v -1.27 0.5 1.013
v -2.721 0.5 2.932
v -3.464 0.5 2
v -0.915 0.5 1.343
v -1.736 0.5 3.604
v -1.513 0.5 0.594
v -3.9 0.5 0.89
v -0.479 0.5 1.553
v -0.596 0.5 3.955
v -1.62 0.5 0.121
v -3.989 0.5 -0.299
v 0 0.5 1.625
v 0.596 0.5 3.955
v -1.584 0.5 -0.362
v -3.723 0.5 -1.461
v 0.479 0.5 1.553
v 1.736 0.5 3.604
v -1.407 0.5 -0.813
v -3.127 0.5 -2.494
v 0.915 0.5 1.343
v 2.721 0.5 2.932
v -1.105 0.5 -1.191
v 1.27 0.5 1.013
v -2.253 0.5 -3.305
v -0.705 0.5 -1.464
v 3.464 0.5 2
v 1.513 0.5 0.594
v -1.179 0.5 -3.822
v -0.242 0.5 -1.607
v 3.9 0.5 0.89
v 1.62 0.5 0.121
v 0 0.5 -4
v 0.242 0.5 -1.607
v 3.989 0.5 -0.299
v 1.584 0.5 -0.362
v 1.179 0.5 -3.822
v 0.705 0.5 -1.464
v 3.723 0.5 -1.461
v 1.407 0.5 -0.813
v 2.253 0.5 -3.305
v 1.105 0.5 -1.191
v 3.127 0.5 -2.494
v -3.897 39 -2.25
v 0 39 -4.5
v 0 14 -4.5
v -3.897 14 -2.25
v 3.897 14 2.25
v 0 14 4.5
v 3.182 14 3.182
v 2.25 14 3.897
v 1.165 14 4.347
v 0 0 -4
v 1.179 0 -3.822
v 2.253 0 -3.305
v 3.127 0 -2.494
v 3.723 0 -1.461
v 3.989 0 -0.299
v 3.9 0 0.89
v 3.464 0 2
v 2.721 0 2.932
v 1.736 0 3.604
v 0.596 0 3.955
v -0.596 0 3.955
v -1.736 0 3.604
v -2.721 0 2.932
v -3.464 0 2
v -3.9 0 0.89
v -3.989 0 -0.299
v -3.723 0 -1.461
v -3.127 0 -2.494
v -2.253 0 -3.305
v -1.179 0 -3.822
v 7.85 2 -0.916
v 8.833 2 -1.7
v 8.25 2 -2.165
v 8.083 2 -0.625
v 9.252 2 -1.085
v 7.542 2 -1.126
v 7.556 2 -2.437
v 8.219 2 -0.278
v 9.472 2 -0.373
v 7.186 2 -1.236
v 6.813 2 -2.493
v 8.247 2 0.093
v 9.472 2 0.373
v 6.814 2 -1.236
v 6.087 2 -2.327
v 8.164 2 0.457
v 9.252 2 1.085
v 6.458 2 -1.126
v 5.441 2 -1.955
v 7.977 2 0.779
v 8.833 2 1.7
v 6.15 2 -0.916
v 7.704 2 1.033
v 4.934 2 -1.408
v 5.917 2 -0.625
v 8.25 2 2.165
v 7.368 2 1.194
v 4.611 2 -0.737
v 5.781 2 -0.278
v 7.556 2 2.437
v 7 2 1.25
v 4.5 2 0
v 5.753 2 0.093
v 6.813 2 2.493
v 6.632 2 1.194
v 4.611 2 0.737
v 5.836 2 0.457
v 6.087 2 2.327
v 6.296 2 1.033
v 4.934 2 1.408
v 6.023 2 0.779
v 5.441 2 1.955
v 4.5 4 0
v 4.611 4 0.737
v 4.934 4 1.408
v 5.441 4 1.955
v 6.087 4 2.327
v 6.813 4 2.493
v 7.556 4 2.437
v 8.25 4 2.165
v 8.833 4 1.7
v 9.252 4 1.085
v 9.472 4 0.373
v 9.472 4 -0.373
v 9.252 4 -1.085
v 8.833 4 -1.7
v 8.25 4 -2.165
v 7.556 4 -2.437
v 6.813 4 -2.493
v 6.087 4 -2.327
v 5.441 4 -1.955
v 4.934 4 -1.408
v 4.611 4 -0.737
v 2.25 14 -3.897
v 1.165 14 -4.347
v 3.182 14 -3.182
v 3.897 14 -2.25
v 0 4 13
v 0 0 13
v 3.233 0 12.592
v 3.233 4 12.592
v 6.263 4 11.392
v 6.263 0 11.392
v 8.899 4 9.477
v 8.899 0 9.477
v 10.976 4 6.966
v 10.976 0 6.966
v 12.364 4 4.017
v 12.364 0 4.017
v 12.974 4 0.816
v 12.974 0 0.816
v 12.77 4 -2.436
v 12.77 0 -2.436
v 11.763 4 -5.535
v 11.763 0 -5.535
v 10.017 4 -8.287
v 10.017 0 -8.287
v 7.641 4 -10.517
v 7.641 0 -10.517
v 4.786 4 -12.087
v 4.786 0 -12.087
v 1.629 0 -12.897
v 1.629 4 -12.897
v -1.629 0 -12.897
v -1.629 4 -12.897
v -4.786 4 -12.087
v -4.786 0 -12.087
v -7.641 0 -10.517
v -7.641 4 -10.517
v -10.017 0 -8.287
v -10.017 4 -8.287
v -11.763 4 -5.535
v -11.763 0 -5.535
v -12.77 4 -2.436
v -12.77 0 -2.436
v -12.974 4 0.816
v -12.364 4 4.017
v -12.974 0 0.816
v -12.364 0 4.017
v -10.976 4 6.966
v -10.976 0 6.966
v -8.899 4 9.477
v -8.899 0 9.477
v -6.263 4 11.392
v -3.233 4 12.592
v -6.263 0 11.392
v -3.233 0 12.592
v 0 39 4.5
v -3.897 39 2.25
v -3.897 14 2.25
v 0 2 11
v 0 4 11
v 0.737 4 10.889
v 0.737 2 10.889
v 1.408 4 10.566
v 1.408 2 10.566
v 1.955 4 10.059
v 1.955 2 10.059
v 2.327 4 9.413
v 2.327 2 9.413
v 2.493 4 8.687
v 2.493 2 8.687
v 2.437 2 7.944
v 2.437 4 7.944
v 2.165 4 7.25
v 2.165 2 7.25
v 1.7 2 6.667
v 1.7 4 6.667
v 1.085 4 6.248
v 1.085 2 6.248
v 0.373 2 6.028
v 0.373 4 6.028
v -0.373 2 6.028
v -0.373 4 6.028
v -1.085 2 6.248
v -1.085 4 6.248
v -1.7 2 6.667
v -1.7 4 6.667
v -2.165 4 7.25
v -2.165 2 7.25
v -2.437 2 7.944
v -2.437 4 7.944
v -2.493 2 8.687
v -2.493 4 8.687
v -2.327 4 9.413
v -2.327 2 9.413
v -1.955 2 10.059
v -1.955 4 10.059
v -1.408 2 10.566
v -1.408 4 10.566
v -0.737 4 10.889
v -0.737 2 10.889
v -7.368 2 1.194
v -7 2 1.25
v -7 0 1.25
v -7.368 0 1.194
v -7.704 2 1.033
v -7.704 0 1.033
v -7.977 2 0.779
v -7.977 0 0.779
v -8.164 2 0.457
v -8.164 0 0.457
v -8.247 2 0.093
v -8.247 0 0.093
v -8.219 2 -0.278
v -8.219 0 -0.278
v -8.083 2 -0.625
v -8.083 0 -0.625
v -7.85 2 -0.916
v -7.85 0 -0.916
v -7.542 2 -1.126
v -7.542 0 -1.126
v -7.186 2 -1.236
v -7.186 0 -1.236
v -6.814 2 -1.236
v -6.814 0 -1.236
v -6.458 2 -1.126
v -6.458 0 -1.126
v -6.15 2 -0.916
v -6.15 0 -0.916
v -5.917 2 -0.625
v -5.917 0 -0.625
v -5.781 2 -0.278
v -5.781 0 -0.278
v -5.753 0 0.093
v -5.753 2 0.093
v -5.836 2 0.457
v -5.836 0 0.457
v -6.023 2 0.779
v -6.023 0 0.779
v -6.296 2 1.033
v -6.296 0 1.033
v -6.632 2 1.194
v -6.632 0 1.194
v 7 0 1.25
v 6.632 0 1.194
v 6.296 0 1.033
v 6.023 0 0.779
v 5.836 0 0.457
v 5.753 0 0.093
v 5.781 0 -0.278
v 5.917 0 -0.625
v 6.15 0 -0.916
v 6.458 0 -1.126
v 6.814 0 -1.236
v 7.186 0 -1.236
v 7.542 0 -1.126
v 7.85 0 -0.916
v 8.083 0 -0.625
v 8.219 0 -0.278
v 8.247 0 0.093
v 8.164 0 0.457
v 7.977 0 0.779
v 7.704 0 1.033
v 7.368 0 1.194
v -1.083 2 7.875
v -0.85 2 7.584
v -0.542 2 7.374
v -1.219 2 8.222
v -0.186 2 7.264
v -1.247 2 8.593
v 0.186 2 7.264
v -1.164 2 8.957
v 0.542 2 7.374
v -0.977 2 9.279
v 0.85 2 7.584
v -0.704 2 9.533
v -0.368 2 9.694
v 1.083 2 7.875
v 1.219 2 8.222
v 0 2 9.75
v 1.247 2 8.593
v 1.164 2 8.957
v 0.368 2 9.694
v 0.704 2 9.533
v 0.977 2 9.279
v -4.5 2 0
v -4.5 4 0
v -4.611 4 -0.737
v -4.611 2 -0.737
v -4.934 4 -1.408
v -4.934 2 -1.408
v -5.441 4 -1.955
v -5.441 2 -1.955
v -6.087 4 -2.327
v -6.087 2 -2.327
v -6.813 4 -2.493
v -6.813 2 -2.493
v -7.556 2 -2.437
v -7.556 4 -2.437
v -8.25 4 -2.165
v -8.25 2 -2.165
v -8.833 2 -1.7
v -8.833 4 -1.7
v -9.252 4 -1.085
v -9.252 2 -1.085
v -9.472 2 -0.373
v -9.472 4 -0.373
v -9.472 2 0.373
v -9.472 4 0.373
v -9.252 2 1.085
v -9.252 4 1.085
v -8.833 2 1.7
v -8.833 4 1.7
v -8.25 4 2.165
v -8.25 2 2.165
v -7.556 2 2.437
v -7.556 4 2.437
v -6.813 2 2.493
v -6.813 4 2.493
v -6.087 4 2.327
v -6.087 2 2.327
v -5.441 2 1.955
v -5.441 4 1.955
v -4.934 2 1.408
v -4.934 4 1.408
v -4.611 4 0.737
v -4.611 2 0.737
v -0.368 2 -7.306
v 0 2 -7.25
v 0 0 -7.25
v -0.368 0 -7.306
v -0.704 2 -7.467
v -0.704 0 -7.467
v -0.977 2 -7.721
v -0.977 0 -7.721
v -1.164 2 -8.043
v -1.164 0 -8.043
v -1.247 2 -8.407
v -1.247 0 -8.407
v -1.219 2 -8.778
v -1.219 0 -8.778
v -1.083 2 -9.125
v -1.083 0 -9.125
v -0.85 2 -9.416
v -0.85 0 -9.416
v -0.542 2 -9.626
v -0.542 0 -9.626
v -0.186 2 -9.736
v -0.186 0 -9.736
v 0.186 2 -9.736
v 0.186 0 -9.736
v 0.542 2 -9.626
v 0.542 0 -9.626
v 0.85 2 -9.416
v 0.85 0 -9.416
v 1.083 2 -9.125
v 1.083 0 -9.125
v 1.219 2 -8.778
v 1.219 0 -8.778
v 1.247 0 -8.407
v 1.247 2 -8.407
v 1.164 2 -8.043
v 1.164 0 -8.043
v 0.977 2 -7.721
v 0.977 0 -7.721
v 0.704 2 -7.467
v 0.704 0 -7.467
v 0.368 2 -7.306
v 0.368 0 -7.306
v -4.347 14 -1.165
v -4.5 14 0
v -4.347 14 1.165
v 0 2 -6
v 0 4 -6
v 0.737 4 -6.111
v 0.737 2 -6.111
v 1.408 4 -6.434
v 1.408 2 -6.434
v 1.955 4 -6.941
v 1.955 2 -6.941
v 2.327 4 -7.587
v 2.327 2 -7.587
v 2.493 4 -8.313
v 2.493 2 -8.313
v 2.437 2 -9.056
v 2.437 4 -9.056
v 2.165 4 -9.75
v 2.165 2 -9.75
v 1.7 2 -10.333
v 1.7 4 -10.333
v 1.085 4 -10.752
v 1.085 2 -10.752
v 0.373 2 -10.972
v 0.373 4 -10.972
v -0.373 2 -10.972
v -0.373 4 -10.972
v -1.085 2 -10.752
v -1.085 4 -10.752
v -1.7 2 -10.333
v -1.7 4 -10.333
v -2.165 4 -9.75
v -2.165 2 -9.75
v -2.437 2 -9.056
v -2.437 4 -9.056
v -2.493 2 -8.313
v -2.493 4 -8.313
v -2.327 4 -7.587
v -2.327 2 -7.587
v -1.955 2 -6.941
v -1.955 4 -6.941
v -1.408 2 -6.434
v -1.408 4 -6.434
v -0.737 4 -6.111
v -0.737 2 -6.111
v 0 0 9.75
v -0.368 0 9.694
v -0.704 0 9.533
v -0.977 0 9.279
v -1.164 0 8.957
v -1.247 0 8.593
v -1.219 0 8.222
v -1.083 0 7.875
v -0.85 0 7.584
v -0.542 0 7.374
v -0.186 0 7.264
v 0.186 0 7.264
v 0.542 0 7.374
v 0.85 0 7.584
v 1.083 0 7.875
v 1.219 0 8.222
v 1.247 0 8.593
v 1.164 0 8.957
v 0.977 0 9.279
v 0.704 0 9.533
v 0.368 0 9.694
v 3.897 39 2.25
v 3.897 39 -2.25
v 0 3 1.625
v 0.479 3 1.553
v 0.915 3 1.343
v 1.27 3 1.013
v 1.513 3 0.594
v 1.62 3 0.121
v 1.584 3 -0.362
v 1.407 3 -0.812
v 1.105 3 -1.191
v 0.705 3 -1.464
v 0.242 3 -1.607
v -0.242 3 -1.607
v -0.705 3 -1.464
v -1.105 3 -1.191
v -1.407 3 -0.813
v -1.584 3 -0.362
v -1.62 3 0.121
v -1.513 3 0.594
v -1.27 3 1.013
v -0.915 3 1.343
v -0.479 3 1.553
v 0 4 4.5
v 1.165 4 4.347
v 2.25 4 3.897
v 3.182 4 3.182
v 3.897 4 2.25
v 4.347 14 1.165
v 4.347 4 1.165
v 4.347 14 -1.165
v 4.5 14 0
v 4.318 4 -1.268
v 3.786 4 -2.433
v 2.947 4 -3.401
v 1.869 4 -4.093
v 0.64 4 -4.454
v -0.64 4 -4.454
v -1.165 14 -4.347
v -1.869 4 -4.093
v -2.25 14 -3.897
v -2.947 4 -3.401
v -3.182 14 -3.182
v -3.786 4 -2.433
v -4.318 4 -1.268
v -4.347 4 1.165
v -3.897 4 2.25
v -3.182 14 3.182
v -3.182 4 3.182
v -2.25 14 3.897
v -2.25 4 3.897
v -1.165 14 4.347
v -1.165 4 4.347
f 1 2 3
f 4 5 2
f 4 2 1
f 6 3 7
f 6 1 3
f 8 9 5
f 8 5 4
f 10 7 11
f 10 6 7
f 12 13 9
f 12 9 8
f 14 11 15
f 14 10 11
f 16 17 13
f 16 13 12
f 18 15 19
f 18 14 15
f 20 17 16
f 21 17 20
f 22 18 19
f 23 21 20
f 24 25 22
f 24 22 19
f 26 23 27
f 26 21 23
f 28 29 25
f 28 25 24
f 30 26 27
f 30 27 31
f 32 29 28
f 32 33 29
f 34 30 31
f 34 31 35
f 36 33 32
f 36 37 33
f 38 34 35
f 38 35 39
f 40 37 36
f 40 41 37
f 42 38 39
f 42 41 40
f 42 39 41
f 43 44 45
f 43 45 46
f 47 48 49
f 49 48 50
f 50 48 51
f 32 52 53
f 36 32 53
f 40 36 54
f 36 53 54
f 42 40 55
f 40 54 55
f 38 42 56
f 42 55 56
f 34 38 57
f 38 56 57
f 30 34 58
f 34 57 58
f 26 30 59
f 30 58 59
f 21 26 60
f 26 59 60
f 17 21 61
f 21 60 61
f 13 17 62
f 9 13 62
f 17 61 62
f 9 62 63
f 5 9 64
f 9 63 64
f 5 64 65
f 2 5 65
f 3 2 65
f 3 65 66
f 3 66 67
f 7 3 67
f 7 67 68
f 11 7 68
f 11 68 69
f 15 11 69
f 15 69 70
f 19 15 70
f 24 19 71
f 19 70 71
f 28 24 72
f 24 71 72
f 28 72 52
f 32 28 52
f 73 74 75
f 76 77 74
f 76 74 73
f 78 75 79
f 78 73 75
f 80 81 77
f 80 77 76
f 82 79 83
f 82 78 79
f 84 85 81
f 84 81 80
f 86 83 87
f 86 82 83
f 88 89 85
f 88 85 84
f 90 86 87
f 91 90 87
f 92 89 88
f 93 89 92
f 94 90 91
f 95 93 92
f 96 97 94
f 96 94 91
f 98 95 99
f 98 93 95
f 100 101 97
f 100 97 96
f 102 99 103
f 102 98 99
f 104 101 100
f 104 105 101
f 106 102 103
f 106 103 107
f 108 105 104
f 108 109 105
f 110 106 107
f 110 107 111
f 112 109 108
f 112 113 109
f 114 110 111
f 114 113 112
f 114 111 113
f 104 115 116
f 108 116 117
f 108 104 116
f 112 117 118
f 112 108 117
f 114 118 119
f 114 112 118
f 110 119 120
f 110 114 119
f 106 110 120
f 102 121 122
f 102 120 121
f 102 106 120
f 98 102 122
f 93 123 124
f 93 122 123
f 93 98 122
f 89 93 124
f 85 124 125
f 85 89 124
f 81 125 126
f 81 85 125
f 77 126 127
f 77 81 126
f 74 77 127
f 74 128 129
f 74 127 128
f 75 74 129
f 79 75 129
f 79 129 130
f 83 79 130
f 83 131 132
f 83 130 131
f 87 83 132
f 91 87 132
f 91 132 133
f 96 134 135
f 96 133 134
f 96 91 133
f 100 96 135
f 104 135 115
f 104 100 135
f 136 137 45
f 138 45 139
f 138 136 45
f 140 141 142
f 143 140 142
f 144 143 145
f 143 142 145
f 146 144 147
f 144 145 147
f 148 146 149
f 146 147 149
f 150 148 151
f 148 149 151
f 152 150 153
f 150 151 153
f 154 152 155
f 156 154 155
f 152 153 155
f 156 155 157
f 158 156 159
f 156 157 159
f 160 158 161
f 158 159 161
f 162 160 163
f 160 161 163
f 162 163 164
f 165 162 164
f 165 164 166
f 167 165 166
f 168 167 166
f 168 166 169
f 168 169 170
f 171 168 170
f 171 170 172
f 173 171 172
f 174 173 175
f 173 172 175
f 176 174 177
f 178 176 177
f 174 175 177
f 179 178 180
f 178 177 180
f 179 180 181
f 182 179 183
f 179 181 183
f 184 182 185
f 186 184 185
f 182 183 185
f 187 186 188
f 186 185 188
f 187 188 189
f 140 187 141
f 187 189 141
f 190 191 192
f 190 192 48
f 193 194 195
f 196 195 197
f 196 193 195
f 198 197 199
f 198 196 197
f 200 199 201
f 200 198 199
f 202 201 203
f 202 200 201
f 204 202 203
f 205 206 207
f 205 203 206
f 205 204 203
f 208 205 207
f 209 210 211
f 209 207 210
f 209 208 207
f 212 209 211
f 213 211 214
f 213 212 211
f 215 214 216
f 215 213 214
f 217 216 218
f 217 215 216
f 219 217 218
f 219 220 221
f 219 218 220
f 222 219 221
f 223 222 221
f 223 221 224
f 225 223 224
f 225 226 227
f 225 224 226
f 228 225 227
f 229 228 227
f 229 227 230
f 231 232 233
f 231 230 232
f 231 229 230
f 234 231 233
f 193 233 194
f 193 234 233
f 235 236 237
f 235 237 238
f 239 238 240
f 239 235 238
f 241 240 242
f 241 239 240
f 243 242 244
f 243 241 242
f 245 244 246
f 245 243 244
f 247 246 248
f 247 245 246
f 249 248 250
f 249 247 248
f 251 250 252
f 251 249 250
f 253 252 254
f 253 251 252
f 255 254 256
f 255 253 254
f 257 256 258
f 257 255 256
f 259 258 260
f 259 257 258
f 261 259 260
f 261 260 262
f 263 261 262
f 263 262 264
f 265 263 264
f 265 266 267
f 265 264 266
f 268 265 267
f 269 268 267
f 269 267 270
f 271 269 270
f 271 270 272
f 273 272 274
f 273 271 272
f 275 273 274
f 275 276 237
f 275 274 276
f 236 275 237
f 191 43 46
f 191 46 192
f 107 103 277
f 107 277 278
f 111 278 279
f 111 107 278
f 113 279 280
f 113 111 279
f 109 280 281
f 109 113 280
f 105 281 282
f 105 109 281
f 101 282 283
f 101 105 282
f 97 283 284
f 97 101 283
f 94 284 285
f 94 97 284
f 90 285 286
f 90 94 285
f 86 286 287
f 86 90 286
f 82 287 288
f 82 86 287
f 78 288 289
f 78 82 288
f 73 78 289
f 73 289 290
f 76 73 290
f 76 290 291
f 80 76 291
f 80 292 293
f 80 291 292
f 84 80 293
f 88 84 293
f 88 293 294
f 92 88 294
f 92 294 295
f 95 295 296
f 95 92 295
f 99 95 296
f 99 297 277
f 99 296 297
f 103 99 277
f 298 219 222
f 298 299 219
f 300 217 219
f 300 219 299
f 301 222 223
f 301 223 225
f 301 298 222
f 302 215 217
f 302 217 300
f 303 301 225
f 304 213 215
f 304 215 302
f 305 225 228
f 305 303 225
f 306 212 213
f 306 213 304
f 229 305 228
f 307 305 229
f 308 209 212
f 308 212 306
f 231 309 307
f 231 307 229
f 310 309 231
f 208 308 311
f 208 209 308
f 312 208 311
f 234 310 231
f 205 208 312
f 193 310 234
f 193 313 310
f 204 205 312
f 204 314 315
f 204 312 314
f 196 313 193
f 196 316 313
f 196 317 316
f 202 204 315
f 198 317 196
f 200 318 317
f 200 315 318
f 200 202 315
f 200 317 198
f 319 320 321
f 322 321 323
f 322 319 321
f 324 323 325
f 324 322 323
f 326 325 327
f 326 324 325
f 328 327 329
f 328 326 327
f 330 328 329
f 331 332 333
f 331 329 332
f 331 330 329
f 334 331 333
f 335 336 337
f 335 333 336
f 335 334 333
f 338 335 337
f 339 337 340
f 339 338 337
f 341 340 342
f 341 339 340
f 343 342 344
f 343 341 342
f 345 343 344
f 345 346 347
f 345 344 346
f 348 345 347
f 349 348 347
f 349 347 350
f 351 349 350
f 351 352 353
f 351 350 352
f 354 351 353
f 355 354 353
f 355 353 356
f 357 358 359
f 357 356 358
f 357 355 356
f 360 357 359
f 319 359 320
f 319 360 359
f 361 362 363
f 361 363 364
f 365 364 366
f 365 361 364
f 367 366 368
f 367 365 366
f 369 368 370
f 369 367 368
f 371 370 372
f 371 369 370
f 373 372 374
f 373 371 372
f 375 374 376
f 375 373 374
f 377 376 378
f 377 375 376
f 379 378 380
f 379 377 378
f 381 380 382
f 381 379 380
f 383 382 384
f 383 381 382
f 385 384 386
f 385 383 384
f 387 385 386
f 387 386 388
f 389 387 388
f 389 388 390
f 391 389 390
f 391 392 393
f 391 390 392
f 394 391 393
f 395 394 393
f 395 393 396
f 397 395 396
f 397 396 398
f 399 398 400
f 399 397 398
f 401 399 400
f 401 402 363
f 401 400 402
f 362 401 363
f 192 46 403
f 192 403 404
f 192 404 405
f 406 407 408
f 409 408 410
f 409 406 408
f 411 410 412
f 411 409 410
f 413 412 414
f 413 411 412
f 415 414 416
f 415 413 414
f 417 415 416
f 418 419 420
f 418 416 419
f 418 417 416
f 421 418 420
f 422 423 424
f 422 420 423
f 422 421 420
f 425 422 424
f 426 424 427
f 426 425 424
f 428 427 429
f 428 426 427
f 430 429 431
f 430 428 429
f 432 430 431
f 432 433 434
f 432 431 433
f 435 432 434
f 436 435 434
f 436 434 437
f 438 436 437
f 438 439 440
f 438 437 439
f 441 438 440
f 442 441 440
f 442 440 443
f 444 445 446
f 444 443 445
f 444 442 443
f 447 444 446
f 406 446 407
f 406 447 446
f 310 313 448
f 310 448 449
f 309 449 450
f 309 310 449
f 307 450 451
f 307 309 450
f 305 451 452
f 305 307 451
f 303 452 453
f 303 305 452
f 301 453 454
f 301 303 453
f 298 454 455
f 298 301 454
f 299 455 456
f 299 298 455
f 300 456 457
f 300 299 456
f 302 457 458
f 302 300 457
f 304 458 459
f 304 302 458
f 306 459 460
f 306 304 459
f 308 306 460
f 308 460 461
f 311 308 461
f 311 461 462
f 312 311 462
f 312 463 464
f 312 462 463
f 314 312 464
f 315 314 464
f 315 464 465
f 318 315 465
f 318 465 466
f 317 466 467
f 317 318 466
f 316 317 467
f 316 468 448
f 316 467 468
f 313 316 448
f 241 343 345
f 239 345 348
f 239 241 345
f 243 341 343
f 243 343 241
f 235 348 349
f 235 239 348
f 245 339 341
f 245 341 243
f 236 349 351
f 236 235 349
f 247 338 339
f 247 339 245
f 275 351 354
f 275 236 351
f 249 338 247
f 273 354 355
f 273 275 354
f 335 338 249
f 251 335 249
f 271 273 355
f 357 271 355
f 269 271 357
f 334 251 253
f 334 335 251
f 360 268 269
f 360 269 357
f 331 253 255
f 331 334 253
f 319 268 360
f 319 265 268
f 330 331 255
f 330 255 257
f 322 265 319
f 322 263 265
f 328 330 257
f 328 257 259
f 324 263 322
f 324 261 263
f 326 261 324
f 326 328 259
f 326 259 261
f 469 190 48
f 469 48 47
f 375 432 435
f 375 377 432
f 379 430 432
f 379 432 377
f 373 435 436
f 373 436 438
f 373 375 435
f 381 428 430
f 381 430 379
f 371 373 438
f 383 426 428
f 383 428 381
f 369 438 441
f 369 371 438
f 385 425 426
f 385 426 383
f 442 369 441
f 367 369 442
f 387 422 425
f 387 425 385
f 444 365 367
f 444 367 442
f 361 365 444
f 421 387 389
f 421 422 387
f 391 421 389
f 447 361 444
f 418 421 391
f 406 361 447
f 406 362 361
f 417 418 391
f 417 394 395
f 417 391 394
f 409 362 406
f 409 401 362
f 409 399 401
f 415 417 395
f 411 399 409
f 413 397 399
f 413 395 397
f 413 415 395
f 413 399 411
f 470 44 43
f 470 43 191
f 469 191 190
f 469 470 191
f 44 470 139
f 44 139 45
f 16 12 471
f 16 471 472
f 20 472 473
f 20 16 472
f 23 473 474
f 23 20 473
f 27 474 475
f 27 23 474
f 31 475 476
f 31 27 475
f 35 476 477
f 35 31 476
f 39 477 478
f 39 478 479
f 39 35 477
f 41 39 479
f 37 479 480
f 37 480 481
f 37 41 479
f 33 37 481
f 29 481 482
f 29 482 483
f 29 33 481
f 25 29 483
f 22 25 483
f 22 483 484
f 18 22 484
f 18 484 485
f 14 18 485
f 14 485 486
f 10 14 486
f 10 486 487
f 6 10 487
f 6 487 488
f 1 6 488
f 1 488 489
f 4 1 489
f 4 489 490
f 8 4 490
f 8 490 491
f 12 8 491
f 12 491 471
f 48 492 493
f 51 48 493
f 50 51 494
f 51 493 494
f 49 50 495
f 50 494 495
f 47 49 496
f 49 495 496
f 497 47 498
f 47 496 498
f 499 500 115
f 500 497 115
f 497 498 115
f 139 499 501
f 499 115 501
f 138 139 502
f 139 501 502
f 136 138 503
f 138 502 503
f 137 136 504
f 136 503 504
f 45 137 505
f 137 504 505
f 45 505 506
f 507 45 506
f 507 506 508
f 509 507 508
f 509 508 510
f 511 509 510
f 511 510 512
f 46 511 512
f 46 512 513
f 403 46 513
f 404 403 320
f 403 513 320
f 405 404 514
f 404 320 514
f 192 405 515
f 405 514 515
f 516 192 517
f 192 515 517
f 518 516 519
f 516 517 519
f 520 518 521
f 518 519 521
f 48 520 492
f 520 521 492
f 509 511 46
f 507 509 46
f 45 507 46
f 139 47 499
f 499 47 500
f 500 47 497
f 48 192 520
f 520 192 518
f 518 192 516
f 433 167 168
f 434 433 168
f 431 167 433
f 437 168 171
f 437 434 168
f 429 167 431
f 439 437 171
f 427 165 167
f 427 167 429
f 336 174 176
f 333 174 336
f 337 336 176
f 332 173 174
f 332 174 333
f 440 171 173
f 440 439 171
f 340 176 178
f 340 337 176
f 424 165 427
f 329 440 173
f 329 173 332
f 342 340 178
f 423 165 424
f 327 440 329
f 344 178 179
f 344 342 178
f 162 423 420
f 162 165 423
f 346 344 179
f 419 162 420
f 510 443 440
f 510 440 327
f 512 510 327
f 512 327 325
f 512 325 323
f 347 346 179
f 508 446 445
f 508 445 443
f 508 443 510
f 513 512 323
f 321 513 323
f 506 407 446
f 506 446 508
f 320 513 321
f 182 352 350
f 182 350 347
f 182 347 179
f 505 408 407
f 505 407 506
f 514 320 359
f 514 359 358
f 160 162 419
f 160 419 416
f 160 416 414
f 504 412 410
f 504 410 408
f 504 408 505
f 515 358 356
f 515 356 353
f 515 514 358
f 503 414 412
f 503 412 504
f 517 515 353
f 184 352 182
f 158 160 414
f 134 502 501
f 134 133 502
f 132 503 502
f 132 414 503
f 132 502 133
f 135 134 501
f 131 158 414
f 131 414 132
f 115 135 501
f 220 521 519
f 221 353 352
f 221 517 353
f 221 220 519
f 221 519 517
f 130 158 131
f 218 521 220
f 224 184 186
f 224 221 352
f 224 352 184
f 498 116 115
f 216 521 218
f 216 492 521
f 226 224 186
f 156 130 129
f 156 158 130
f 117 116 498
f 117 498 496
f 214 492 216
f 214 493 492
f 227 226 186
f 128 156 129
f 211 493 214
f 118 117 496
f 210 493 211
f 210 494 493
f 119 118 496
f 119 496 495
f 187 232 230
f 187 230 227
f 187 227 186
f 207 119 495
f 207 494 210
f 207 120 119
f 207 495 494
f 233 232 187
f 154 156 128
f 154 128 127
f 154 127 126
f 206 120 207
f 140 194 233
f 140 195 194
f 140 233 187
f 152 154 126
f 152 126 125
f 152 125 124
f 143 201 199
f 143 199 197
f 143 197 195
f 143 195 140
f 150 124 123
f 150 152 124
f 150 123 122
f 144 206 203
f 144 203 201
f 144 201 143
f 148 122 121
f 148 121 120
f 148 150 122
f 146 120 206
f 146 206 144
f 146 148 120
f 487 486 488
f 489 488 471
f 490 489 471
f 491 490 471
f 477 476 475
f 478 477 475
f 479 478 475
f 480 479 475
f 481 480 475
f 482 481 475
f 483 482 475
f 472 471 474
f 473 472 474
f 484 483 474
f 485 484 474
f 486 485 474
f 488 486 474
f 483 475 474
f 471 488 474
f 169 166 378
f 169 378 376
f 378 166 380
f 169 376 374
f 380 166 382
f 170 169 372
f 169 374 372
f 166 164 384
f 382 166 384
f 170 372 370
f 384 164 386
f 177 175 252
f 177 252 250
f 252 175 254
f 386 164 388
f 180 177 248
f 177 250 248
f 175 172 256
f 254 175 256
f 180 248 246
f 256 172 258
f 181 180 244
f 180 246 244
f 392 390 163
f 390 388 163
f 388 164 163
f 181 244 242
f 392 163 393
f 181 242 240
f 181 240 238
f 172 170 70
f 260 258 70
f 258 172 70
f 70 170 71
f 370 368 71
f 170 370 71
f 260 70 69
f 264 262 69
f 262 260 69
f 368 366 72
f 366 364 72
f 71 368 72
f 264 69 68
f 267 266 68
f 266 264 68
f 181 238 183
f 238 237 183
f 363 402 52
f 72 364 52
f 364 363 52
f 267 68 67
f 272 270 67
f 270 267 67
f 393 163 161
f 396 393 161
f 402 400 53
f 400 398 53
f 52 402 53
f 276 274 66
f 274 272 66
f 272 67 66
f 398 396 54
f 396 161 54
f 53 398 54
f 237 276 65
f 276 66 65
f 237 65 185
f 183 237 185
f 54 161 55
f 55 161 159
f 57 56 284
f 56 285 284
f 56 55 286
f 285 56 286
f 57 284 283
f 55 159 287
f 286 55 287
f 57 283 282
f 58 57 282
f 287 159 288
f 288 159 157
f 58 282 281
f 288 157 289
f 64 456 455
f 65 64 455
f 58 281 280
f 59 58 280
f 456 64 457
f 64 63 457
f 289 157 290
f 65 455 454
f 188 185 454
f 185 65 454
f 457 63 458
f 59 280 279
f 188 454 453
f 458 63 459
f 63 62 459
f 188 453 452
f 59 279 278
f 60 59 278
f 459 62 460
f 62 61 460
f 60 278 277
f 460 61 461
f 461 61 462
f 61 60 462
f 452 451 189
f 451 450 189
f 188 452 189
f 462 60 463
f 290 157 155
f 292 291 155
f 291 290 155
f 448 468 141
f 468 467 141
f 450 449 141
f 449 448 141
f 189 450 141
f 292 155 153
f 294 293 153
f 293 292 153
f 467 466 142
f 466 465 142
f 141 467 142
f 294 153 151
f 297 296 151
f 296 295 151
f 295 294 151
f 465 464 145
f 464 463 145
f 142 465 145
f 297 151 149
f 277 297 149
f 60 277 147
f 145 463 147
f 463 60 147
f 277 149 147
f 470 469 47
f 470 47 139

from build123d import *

# Parameters (mm, degrees)
CROQUIS3_R                 = 13
SALIENTE_EXTRUIR1_DEPTH    = 4
CROQUIS4_R                 = 4.5
SALIENTE_EXTRUIR2_DEPTH    = 35
CORTAR_EXTRUIR3_DEPTH      = 44.116122275
CORTAR_EXTRUIR3_DEPTH_BACK = 44.116122275
CROQUIS8_R                 = 1.25
CORTAR_EXTRUIR5_DEPTH      = 40.534794802
CORTAR_EXTRUIR5_DEPTH_BACK = 2
CROQUIS10_R                = 2.5
CROQUIS10_R_2              = 1.25
CROQUIS9_R                 = 1.625
CORTAR_EXTRUIR4_DEPTH      = 3
CROQUIS11_R                = 4
CORTAR_EXTRUIR6_DEPTH      = 0.5
CROQUIS12_OUTSIDE_W        = 38.72
CROQUIS12_OUTSIDE_H        = 38.72
CORTAR_EXTRUIR7_DEPTH      = 25


with BuildPart() as part:
    # Croquis3 → Saliente-Extruir1 (new body)
    with BuildSketch(Plane(origin=(0, 0, 0), x_dir=(1, 0, 0), z_dir=(0, 1, 0))):
        with Locations(Location((0, 0, 0), (0, 0, 270))):
            Circle(CROQUIS3_R)
    extrude(amount=SALIENTE_EXTRUIR1_DEPTH)

    # Croquis4 → Saliente-Extruir2 (add)
    with BuildSketch(Plane(origin=(0, 4, 0), x_dir=(1, 0, 0), z_dir=(0, 1, 0))):
        with Locations(Location((0, 0, 0), (0, 0, 270))):
            Circle(CROQUIS4_R)
    extrude(amount=SALIENTE_EXTRUIR2_DEPTH)

    # Croquis8 → Cortar-Extruir3 (cut, two sides: drawn at the far end of the back side and taken through both)
    with BuildSketch(Plane.XZ.offset(-CORTAR_EXTRUIR3_DEPTH_BACK)):
        with Locations(Location((0, 8.5, 0), (0, 0, 90))):
            Circle(CROQUIS8_R)
        with Locations(Location((0, -8.5, 0), (0, 0, 90))):
            Circle(CROQUIS8_R)
        with Locations(Location((-7, 0, 0), (0, 0, 90))):
            Circle(CROQUIS8_R)
        with Locations(Location((7, 0, 0), (0, 0, 90))):
            Circle(CROQUIS8_R)
    extrude(amount=CORTAR_EXTRUIR3_DEPTH + CORTAR_EXTRUIR3_DEPTH_BACK, mode=Mode.SUBTRACT)

    # Croquis10 → Cortar-Extruir5 (cut, two sides: drawn at the far end of the back side and taken through both)
    # profile 1 of 4: a face of its own
    with BuildSketch(Plane(origin=(0, 4, 0), x_dir=(1, 0, 0), z_dir=(0, 1, 0)).offset(-CORTAR_EXTRUIR5_DEPTH_BACK)):
        with Locations(Location((0, 8.5, 0), (0, 0, 270))):
            Circle(CROQUIS10_R)
    # profile 2 of 4: a face of its own
    with BuildSketch(Plane(origin=(0, 4, 0), x_dir=(1, 0, 0), z_dir=(0, 1, 0)).offset(-CORTAR_EXTRUIR5_DEPTH_BACK)):
        with Locations(Location((0, -8.5, 0), (0, 0, 270))):
            Circle(CROQUIS10_R)
    # profile 3 of 4: a face of its own
    with BuildSketch(Plane(origin=(0, 4, 0), x_dir=(1, 0, 0), z_dir=(0, 1, 0)).offset(-CORTAR_EXTRUIR5_DEPTH_BACK)):
        with Locations(Location((-7, 0, 0), (0, 0, 0.000410889))):
            Circle(CROQUIS10_R)
        with Locations(Location((-7, 0, 0), (0, 0, 270))):
            Circle(CROQUIS10_R_2, mode=Mode.SUBTRACT)
    # profile 4 of 4: a face of its own
    with BuildSketch(Plane(origin=(0, 4, 0), x_dir=(1, 0, 0), z_dir=(0, 1, 0)).offset(-CORTAR_EXTRUIR5_DEPTH_BACK)):
        with Locations(Location((7, 0, 0), (0, 0, 180.000410889))):
            Circle(CROQUIS10_R)
        with Locations(Location((7, 0, 0), (0, 0, 270))):
            Circle(CROQUIS10_R_2, mode=Mode.SUBTRACT)
    extrude(amount=CORTAR_EXTRUIR5_DEPTH + CORTAR_EXTRUIR5_DEPTH_BACK, mode=Mode.SUBTRACT)

    # Croquis9 → Cortar-Extruir4 (cut)
    with BuildSketch(Plane(origin=(0, 0, 0), x_dir=(1, 0, 0), z_dir=(0, 1, 0))):
        with Locations(Location((0, 0, 0), (0, 0, 270))):
            Circle(CROQUIS9_R)
    extrude(amount=CORTAR_EXTRUIR4_DEPTH, mode=Mode.SUBTRACT)

    # Croquis11 → Cortar-Extruir6 (cut)
    with BuildSketch(Plane.XZ):
        with Locations(Location((0, 0, 0), (0, 0, 270))):
            Circle(CROQUIS11_R)
    extrude(amount=-CORTAR_EXTRUIR6_DEPTH, mode=Mode.SUBTRACT)

    # Croquis12 outside → Cortar-Extruir7 (cut)
    with BuildSketch(Plane(origin=(0, 39, 0), x_dir=(1, 0, 0), z_dir=(0, 1, 0))):
        Rectangle(CROQUIS12_OUTSIDE_W, CROQUIS12_OUTSIDE_H)
        Polygon((0, 4.5), (-3.897114317, 2.25), (-3.897114317, -2.25), (0, -4.5), (3.897114317, -2.25), (3.897114317, 2.25), align=None, mode=Mode.SUBTRACT)
    extrude(amount=-CORTAR_EXTRUIR7_DEPTH, mode=Mode.SUBTRACT)


solid = part.part
